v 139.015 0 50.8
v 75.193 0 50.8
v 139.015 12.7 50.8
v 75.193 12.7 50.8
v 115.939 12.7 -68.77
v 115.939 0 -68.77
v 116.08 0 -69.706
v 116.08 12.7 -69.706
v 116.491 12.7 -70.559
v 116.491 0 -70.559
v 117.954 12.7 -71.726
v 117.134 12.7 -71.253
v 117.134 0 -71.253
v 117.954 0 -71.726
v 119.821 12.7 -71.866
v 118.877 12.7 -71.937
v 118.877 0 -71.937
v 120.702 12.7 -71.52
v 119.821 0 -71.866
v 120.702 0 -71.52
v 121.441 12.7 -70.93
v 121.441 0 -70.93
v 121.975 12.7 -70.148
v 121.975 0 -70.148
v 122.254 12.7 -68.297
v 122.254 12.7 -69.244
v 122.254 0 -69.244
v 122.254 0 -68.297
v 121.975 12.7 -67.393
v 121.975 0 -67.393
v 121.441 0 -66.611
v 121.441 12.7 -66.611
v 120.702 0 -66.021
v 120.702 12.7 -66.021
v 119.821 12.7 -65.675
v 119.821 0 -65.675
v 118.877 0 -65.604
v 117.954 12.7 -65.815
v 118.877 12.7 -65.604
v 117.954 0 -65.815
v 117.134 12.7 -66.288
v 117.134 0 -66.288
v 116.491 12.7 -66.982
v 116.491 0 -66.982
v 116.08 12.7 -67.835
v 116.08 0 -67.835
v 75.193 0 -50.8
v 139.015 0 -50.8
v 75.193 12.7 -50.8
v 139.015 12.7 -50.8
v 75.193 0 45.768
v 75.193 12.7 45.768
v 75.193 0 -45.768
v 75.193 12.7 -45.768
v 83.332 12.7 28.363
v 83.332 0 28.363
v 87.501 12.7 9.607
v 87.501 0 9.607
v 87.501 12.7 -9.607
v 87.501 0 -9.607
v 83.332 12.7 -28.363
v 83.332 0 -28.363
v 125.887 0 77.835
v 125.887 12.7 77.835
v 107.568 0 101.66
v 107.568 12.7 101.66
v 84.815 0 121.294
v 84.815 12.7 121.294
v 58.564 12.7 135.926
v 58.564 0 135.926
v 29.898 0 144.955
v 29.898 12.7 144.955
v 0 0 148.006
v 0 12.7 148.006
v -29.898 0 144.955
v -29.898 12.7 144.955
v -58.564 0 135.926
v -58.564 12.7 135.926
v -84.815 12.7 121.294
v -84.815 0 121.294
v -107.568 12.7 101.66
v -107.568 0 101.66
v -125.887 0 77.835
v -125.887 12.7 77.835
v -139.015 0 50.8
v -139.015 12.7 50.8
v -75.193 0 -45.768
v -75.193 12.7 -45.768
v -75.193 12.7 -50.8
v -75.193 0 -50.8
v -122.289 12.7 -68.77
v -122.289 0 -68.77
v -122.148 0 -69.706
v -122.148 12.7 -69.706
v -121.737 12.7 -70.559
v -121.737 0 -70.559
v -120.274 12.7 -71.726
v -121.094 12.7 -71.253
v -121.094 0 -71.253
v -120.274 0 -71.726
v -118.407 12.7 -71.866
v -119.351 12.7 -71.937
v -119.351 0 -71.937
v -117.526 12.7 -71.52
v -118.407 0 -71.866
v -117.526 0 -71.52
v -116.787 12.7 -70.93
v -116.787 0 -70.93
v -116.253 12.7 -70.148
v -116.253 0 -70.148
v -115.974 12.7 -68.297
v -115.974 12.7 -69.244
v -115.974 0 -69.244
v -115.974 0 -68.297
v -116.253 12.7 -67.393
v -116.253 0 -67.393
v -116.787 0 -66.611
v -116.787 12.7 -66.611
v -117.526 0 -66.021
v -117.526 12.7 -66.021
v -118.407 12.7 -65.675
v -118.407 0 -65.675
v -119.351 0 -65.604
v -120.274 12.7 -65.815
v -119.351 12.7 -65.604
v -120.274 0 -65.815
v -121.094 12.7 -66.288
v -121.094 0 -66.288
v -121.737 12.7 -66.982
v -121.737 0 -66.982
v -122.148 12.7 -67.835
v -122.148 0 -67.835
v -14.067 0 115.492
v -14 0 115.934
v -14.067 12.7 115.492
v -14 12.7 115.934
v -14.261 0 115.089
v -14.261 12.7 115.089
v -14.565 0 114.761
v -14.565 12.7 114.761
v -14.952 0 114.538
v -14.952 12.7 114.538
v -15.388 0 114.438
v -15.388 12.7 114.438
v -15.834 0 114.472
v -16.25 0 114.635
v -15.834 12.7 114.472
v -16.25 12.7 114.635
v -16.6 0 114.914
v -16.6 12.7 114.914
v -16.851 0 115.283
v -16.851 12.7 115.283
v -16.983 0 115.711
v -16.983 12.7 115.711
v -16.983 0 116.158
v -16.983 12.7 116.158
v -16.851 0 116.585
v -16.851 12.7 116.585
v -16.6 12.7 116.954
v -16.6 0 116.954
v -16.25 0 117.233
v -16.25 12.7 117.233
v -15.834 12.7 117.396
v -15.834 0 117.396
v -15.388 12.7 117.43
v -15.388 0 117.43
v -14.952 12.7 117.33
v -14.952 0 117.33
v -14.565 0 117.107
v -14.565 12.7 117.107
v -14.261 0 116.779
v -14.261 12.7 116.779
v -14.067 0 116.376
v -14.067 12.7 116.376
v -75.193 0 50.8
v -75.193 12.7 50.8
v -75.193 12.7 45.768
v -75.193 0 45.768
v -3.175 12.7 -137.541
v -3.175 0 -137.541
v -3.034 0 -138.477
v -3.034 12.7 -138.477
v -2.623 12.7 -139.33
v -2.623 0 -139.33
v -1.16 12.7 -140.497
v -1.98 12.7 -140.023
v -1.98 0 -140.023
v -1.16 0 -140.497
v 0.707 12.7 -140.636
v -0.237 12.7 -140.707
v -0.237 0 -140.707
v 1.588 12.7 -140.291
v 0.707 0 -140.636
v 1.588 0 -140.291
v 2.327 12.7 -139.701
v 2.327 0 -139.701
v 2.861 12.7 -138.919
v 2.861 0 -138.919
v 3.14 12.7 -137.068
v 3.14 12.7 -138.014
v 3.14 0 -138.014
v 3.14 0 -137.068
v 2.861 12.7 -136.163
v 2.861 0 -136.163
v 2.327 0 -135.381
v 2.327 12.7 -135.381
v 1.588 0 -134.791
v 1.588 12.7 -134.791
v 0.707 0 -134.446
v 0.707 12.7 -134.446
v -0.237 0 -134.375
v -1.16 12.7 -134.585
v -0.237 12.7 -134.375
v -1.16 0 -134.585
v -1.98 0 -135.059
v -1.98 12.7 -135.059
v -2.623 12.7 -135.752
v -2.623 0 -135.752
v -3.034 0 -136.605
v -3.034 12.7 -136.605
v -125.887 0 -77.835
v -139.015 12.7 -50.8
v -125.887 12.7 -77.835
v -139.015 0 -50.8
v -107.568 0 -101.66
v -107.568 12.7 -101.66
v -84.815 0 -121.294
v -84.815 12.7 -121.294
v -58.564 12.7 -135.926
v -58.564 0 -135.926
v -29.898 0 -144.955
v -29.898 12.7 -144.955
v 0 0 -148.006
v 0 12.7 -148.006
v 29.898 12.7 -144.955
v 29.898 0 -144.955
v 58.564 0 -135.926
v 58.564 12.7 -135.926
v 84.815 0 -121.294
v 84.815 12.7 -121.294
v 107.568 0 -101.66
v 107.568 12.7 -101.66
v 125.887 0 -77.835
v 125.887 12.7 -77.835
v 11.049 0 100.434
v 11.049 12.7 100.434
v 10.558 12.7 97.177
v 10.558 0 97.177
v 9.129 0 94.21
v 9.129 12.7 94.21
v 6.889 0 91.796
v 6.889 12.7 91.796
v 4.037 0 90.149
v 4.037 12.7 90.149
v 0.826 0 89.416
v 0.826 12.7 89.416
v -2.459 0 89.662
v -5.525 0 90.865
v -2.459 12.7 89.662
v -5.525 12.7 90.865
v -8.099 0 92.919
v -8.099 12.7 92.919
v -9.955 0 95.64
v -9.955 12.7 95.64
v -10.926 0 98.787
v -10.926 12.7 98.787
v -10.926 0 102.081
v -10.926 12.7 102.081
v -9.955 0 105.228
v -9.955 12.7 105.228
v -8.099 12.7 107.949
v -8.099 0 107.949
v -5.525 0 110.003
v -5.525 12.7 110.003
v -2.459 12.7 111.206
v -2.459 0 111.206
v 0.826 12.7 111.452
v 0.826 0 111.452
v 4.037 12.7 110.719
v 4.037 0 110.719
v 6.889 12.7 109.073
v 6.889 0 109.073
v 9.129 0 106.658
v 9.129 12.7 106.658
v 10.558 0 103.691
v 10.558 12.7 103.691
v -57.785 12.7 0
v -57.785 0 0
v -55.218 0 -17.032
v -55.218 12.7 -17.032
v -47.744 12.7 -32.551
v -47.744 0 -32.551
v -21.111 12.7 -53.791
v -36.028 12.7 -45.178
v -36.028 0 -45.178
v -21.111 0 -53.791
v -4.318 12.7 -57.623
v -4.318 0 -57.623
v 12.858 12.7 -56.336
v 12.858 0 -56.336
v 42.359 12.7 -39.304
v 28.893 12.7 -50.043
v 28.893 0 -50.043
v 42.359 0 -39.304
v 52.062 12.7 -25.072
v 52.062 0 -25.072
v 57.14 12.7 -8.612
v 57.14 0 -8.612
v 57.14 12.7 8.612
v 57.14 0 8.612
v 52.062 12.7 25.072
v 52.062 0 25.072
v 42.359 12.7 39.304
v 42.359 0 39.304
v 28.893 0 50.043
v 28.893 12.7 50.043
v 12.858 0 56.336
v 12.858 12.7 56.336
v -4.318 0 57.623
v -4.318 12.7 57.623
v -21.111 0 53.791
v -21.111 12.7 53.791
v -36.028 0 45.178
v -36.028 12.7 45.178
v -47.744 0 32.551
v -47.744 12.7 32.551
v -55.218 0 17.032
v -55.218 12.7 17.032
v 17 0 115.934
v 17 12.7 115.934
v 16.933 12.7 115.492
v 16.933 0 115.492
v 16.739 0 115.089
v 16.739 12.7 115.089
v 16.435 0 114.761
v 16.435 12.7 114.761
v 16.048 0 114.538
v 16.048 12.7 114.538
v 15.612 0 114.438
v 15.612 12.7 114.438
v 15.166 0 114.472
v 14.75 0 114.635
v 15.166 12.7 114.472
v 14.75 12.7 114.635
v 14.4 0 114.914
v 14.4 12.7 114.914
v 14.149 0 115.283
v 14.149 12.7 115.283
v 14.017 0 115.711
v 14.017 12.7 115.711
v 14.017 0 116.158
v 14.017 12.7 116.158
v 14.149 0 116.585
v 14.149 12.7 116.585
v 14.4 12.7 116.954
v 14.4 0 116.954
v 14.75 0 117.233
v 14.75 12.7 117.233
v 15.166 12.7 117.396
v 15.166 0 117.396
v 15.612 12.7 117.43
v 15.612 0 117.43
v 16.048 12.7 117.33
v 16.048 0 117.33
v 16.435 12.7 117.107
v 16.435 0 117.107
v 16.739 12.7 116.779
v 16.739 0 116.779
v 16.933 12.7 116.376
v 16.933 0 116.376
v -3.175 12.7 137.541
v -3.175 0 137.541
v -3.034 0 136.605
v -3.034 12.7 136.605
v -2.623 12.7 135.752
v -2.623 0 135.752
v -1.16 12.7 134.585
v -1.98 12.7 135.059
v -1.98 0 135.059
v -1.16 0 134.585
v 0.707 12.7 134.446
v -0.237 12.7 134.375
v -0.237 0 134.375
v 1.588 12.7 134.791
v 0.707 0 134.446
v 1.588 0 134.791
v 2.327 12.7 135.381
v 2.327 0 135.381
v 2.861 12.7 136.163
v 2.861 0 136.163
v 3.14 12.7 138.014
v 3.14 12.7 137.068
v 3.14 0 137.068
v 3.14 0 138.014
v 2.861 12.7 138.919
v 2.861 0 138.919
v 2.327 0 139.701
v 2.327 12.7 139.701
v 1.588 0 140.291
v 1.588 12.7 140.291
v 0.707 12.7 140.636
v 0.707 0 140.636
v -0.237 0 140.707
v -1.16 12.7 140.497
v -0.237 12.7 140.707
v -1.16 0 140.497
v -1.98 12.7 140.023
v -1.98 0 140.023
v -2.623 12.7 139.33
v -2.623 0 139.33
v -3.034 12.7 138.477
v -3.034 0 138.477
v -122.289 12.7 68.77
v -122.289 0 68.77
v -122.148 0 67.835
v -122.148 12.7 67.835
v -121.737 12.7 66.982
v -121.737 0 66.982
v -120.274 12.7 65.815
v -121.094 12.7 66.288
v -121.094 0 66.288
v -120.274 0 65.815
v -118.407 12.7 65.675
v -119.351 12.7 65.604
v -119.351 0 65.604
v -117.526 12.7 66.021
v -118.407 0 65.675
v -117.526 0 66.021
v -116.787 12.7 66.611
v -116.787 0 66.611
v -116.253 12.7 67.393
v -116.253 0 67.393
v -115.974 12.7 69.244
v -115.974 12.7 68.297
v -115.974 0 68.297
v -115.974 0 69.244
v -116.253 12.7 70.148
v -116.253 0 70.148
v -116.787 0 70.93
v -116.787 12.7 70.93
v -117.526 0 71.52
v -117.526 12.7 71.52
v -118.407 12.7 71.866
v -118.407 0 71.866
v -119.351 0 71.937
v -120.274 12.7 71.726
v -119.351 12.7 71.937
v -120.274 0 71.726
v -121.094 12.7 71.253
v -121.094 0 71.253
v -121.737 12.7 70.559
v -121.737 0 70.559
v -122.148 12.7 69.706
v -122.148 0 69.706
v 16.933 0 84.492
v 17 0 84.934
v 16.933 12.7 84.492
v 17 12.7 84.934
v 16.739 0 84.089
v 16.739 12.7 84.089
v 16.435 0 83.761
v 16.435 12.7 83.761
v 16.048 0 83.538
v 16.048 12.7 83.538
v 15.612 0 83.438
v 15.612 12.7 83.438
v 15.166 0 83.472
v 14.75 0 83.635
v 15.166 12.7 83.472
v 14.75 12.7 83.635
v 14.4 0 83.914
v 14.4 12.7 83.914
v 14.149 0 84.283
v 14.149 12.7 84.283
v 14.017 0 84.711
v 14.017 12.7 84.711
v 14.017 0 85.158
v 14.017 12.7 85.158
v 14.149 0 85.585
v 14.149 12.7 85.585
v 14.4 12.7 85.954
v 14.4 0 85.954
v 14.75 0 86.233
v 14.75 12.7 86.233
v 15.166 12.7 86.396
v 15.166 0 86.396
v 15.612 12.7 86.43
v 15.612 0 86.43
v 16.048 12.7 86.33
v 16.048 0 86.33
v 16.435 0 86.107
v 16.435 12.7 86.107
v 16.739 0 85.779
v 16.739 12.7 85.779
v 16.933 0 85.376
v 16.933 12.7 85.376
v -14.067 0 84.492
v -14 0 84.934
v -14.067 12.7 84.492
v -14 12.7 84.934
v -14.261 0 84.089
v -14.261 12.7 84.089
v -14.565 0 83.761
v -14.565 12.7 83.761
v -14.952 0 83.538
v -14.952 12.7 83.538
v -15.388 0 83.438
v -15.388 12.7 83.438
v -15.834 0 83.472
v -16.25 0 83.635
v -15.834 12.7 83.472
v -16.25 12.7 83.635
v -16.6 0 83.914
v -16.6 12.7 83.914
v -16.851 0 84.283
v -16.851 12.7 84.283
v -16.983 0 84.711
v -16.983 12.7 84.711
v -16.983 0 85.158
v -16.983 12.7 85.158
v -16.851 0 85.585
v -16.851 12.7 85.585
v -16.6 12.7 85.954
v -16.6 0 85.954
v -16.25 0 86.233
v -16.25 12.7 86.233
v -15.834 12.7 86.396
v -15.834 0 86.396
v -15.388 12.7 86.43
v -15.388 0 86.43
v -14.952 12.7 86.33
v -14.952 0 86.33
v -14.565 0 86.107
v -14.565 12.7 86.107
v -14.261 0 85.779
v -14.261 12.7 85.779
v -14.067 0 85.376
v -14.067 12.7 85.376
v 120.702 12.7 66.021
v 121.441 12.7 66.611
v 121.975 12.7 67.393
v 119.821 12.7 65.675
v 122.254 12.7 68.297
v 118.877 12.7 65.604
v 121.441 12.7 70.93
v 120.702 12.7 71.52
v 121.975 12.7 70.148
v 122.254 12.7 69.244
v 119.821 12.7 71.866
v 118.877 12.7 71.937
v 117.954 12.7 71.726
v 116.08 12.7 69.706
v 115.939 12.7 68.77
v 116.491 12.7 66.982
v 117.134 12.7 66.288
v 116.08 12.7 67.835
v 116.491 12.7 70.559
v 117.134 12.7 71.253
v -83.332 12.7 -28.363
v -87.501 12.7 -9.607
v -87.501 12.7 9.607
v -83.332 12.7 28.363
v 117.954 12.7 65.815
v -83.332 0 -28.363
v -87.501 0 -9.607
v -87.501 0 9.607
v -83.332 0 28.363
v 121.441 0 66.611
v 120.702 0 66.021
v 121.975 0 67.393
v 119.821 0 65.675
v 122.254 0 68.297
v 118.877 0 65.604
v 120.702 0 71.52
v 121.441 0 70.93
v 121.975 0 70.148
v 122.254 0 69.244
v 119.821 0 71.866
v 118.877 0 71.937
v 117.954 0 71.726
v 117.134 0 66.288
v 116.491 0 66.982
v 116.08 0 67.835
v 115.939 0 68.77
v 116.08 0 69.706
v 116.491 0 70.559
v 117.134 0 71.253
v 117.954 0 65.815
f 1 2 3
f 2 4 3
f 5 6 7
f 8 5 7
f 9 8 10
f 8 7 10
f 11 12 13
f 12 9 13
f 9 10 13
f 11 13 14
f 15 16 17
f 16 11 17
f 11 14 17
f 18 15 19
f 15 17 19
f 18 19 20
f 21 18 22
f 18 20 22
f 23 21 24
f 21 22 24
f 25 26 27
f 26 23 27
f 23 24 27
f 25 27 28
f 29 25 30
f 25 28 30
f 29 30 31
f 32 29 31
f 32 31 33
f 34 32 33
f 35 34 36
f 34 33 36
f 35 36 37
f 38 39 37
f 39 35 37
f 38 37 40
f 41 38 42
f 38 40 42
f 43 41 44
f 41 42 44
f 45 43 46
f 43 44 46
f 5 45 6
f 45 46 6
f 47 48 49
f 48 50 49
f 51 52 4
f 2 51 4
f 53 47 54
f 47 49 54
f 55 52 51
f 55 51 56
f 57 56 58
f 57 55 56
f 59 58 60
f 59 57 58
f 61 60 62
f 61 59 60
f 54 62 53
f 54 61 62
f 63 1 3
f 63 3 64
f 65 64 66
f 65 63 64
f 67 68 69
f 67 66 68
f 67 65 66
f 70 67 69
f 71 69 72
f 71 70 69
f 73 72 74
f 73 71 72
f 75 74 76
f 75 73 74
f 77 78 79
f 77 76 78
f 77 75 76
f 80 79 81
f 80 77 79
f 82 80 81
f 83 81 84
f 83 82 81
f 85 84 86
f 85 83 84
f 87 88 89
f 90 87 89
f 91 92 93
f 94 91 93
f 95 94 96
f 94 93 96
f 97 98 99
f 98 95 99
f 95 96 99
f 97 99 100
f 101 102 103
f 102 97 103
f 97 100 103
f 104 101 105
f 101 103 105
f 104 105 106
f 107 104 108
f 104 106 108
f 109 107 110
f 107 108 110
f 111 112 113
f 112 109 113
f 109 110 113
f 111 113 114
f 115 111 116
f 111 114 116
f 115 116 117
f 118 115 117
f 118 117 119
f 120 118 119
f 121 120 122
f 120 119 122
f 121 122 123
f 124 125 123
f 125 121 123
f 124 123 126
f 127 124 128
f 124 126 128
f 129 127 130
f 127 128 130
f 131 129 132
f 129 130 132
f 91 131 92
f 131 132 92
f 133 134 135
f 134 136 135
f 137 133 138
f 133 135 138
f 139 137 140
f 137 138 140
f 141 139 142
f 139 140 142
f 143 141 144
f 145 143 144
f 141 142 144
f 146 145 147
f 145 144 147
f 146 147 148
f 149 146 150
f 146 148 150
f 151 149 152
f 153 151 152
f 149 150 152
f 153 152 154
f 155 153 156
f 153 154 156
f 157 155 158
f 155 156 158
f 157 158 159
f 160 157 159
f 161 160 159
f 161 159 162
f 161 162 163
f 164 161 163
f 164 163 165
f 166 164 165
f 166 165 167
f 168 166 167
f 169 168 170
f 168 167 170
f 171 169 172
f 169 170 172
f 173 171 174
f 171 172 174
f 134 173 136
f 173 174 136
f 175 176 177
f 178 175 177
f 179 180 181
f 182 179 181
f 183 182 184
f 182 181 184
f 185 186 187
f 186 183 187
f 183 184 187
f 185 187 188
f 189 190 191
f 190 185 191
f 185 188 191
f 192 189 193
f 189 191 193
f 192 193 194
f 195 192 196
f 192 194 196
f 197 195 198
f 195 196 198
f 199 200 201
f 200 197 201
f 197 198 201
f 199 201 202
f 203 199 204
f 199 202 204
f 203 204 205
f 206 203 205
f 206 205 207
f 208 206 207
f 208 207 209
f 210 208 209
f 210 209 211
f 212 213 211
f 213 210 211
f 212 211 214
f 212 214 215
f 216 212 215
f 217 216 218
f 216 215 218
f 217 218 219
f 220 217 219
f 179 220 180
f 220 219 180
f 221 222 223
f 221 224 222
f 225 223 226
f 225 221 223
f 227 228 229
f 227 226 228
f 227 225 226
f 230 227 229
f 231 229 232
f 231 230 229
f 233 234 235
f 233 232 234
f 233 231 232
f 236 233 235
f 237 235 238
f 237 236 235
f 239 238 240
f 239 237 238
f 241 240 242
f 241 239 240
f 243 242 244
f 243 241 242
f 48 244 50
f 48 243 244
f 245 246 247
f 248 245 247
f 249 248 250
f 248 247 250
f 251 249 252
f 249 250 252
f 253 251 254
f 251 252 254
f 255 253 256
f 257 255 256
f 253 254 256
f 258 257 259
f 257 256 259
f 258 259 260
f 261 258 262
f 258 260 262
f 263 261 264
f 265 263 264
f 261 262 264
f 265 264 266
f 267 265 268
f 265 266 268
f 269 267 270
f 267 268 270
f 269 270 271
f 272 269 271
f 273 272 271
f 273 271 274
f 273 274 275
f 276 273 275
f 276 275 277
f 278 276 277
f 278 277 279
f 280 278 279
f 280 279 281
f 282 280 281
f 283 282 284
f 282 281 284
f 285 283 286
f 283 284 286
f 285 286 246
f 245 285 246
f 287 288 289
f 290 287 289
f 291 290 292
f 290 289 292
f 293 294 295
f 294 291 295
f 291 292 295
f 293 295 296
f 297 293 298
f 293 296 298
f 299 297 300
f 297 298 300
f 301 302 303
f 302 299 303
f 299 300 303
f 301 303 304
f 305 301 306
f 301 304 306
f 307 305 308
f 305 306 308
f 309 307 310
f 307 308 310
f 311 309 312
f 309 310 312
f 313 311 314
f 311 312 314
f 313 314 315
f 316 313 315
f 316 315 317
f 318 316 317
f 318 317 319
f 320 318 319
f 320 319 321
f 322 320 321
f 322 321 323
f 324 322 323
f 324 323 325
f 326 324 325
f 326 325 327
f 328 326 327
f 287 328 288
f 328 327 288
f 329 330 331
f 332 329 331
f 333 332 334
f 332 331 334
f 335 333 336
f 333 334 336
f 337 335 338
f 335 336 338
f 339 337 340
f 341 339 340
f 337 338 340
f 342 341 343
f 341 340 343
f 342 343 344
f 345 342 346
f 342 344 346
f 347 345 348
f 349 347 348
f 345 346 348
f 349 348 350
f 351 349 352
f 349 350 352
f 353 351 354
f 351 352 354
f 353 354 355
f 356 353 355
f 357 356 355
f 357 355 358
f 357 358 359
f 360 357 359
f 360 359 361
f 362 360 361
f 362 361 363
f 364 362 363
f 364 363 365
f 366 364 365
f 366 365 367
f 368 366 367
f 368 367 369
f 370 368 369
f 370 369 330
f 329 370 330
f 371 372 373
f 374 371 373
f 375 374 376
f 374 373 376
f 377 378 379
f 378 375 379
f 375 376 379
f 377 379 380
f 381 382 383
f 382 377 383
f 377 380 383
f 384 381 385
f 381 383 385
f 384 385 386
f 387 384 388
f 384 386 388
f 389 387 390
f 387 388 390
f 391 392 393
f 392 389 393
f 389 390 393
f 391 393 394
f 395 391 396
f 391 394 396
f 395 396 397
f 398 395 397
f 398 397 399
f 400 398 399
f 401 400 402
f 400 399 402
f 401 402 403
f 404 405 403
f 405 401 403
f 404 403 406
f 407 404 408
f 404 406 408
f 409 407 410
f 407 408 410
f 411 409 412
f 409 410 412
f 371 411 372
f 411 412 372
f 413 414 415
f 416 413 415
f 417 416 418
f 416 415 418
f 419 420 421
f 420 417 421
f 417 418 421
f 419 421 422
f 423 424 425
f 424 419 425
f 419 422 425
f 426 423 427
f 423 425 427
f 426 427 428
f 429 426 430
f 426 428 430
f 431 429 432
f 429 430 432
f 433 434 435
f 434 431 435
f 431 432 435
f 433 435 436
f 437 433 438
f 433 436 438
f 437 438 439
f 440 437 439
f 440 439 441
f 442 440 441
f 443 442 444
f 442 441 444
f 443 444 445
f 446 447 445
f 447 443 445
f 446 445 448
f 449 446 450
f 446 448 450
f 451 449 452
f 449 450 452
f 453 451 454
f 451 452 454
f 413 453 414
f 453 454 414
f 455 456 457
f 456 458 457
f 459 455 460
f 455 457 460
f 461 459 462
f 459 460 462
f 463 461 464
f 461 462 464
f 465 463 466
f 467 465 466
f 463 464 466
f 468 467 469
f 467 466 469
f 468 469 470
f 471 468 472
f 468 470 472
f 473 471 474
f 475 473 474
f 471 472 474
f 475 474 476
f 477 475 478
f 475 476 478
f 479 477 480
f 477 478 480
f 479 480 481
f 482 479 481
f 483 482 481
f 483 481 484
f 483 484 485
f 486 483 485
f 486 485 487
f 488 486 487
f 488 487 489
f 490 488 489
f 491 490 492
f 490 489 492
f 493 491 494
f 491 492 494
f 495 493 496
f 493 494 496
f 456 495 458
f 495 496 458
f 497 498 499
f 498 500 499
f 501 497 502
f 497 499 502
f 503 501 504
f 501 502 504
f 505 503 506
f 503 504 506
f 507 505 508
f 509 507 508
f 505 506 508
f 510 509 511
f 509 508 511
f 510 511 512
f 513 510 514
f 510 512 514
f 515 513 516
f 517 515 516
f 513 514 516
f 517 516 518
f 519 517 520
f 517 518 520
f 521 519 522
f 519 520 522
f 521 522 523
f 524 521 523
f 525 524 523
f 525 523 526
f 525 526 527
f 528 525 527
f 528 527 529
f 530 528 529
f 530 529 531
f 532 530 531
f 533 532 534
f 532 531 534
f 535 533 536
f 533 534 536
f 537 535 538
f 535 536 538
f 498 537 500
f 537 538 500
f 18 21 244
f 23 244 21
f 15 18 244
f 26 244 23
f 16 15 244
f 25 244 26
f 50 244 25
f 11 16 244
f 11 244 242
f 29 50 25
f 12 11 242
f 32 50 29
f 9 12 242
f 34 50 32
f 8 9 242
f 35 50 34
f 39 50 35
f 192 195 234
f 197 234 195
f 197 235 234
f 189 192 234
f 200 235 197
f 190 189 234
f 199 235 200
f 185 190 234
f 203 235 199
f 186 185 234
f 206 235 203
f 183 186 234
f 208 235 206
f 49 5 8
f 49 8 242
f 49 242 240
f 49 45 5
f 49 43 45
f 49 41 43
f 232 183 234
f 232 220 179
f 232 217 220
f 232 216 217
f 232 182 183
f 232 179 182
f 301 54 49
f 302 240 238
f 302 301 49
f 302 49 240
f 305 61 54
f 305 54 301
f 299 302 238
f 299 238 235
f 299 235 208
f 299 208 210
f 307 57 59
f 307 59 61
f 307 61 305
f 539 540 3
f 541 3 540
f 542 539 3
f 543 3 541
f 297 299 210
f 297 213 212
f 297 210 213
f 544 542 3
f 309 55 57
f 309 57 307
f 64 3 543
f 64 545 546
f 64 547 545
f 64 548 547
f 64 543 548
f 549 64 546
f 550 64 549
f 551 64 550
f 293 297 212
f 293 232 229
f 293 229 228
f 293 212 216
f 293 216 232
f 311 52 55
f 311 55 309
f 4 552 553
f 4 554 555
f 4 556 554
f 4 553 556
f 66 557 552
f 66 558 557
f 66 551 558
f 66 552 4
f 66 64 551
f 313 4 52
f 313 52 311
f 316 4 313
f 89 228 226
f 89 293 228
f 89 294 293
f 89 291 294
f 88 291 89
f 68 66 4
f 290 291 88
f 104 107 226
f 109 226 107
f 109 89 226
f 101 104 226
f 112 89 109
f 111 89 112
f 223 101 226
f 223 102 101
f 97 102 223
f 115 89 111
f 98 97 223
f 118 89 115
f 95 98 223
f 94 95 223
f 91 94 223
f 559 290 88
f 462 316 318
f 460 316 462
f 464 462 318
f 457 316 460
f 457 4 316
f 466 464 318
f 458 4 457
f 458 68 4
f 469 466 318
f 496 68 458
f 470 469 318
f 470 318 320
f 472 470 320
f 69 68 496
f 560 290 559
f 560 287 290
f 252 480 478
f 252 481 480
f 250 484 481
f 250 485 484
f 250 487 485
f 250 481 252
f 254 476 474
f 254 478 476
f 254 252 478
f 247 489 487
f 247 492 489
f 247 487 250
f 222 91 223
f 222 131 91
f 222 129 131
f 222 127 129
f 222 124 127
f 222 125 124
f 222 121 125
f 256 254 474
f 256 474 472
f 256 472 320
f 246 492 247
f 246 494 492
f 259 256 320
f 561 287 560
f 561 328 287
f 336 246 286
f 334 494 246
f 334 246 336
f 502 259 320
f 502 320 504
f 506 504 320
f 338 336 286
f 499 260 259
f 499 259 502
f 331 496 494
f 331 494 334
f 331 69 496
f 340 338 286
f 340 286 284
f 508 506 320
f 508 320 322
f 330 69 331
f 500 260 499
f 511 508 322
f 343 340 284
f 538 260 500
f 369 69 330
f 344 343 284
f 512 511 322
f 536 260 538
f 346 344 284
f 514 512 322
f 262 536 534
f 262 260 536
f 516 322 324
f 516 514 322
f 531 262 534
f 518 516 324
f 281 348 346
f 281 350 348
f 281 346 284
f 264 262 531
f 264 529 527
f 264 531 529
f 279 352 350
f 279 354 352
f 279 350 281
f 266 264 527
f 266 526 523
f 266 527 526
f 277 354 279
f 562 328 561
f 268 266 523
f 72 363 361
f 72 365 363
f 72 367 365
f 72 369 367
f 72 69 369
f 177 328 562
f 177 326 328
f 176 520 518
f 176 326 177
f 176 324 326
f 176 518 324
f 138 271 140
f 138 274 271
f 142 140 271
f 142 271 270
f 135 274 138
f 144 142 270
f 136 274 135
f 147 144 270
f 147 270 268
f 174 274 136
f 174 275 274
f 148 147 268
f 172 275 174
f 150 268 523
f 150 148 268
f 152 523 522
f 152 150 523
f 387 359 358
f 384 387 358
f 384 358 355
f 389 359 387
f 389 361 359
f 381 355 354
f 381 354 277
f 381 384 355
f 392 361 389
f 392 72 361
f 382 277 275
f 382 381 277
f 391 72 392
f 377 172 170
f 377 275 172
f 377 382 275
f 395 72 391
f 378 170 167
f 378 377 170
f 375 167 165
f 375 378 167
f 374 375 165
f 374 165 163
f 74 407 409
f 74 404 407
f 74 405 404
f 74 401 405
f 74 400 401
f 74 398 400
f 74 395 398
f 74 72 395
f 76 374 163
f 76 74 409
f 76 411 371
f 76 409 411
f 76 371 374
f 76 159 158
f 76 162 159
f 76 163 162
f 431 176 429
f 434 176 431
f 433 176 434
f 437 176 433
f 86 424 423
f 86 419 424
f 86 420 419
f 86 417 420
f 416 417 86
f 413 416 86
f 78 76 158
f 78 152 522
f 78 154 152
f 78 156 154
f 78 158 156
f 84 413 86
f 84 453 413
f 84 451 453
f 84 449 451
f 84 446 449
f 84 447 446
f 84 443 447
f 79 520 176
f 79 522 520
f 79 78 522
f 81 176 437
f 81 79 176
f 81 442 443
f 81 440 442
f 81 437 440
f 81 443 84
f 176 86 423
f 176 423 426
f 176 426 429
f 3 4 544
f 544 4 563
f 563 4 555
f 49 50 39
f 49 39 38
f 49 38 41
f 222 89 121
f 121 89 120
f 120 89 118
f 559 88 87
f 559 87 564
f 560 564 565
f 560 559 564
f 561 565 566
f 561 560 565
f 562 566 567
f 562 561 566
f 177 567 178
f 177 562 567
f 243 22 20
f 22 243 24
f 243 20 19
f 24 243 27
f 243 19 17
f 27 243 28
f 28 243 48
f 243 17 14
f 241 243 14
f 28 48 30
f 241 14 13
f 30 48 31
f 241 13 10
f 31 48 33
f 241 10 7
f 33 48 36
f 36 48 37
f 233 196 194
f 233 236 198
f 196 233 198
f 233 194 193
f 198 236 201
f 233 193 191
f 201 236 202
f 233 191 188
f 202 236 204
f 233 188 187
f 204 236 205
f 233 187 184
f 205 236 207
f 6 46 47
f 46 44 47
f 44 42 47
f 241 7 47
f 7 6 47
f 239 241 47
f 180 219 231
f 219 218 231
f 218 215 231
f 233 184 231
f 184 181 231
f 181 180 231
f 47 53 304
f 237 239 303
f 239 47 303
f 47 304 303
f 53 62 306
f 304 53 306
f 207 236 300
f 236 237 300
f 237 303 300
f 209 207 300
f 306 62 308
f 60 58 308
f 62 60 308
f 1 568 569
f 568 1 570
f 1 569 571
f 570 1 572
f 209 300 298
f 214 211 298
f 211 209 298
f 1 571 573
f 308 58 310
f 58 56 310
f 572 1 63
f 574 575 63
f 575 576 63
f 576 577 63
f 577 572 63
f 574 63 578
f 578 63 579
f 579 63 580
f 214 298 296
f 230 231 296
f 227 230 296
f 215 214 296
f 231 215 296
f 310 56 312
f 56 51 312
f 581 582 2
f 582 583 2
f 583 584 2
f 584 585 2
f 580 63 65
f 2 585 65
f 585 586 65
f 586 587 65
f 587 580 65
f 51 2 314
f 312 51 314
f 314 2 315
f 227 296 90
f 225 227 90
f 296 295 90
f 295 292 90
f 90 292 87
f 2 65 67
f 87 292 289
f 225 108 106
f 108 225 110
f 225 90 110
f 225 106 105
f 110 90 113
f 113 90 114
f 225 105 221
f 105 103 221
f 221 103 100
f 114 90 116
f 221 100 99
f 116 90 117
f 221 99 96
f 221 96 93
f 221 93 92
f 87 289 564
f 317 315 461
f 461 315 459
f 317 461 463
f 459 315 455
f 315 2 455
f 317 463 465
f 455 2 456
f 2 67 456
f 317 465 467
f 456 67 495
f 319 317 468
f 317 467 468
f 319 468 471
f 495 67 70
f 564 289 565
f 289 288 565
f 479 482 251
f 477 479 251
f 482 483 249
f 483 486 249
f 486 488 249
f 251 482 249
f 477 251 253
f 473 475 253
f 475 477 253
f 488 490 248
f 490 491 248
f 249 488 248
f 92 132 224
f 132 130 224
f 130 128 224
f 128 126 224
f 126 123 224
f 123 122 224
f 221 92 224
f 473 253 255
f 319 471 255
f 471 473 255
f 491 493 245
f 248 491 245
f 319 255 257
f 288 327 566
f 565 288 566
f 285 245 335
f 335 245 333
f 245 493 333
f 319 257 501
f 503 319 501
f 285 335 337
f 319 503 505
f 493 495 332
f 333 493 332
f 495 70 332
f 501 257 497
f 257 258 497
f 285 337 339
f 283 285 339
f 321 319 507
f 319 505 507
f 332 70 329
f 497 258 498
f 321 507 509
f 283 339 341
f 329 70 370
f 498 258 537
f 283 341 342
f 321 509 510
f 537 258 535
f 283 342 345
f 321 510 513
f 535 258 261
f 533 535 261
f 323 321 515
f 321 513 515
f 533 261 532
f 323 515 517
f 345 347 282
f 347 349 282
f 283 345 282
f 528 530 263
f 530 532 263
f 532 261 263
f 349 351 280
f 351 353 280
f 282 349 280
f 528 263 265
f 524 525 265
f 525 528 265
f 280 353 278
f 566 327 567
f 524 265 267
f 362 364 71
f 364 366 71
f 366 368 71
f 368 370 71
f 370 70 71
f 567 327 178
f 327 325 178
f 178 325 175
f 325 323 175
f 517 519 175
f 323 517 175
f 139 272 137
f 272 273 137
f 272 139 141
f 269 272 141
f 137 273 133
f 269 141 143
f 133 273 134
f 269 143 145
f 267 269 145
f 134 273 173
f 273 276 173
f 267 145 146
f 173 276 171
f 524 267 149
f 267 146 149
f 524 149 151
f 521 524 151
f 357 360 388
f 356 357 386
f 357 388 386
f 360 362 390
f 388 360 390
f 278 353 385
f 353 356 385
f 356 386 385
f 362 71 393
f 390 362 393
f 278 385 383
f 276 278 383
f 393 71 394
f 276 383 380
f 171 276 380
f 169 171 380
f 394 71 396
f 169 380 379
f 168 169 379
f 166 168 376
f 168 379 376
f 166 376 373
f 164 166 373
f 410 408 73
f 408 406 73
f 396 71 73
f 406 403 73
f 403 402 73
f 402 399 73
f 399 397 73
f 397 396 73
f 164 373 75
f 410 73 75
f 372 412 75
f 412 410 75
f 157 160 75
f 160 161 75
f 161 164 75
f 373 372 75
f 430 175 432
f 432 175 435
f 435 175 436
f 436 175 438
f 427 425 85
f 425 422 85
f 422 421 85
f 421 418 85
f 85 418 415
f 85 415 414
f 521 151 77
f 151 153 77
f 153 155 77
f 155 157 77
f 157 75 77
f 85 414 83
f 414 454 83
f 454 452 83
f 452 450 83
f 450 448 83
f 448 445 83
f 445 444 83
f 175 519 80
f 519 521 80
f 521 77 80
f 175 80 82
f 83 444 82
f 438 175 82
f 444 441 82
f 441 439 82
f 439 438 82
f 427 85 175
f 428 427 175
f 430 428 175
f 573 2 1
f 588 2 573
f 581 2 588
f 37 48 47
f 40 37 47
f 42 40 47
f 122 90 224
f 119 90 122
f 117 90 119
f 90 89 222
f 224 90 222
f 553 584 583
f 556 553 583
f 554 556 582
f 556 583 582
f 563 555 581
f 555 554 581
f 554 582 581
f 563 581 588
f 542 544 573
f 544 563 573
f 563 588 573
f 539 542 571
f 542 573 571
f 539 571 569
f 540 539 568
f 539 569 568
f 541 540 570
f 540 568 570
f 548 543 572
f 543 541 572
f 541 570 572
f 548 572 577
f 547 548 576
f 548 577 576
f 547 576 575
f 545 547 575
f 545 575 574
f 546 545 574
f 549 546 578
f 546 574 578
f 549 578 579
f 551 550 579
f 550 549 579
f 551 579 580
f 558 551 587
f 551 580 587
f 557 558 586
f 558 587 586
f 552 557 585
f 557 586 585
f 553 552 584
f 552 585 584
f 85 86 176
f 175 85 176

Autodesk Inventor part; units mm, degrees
ref_plane "YZ Plane" through (0, 0, 0) normal (1, 0, 0) x (0, 1, 0)
ref_plane "XZ Plane" through (0, 0, 0) normal (0, 1, 0) x (-1, 0, 0)
ref_plane "XY Plane" through (0, 0, 0) normal (0, 0, 1) x (1, 0, 0)
sketch "Sketch1" plane through (0, 0, 0) normal (0, 1, 0) x (-1, 0, 0)
  circle A0 centre (0, 0) radius 57.785
  circle A1 centre (0, 0) radius 148.0058
  line L0 (0, 0) -> (-122.3635, 70.6466) construction
  line L1 (0, 0) -> (141.2932, 0) construction
  line L2 (-122.3635, 70.6466) -> (0, 0) construction
  line L3 (0, 0) -> (-128.1768, -74.0029) construction
  circle A2 centre (0, 0) radius 148.0058 construction
  line L4 (0, 0) -> (148.0058, 0) construction
  circle A3 centre (0, 0) radius 137.541 construction
  circle A4 centre (-119.114, -68.7705) radius 3.175
  circle A5 centre (0, -137.541) radius 3.175
  circle A6 centre (119.114, -68.7705) radius 3.175
  circle A7 centre (119.114, 68.7705) radius 3.175
  circle A8 centre (0, 137.541) radius 3.175
  circle A9 centre (-119.114, 68.7705) radius 3.175
  dimension "d22" = 275.082
  dimension "d16" = 115.57
  dimension "d17" = 296.0116
  dimension "d20" = 150
  dimension "d21" = 150
  dimension "d23" = 6.35
  dimension "d24" = 360
extrude "Extrusion1" add sketch "Sketch1" along normal blind 12.7
sketch "Sketch2" plane through (0, 12.7, 0) normal (0, 1, 0) x (1, 0, 0)
  circle A0 centre (0, 0) radius 123.4694 construction
  line L0 (-21.15, -84.9341) -> (-21.15, -115.9341) construction
  line L1 (15.5, -121.5841) -> (-15.5, -121.5841) construction
  line L2 (21.15, -115.9341) -> (21.15, -84.9341) construction
  line L3 (-15.5, -79.2841) -> (15.5, -79.2841) construction
  line L4 (15.5, -79.2841) -> (21.15, -84.9341) construction
  line L5 (21.15, -115.9341) -> (15.5, -121.5841) construction
  line L6 (-15.5, -121.5841) -> (-21.15, -115.9341) construction
  line L7 (-21.15, -84.9341) -> (-15.5, -79.2841) construction
  line L8 (-15.5, -115.9341) -> (15.5, -115.9341) construction
  line L9 (15.5, -115.9341) -> (15.5, -84.9341) construction
  line L10 (15.5, -84.9341) -> (-15.5, -84.9341) construction
  line L11 (-15.5, -84.9341) -> (-15.5, -115.9341) construction
  line L12 (-15.5, -115.9341) -> (15.5, -84.9341) construction
  line L13 (15.5, -115.9341) -> (-15.5, -84.9341) construction
  circle A1 centre (15.5, -84.9341) radius 1.5
  circle A2 centre (15.5, -115.9341) radius 1.5
  circle A3 centre (-15.5, -115.9341) radius 1.5
  circle A4 centre (-15.5, -84.9341) radius 1.5
  circle A5 centre (0, -100.4341) radius 11.049
  circle A6 centre (0, -100.4341) radius 22.9616 construction
  dimension "d27" = 246.9388
  dimension "d32" = 3
  dimension "d33" = 3
  dimension "d34" = 3
  dimension "d35" = 22.098
  dimension "d44" = 45.9232
extrude "Extrusion2" cut sketch "Sketch2" against normal through all
sketch "Sketch3" plane through (0, 12.7, 0) normal (0, 1, 0) x (1, 0, 0)
  line L0 (-148.0058, 50.8) -> (-148.0058, -50.8)
  line L1 (148.0058, -50.8) -> (148.0058, 50.8)
  line L2 (148.0058, 50.8) -> (-148.0058, -50.8) construction
  line L3 (-148.0058, 50.8) -> (148.0058, -50.8) construction
  line L4 (75.193, -50.8) -> (-75.193, 50.8) construction
  line L5 (-75.193, -50.8) -> (75.193, 50.8) construction
  line L6 (-148.0058, -50.8) -> (-75.193, -50.8)
  line L7 (75.193, -50.8) -> (148.0058, -50.8)
  line L8 (148.0058, 50.8) -> (75.193, 50.8)
  line L9 (-75.193, 50.8) -> (-148.0058, 50.8)
  line L10 (-75.193, -50.8) -> (-75.193, -45.7676)
  line L11 (-75.193, 45.7676) -> (-75.193, 50.8)
  line L12 (75.193, 50.8) -> (75.193, 45.7676)
  line L13 (75.193, -45.7676) -> (75.193, -50.8)
  arc A0 (75.193, -45.7676) -> (75.193, 45.7676) centre (0, 0) ccw
  arc A1 (-75.193, 45.7676) -> (-75.193, -45.7676) centre (0, 0) ccw
  dimension "d38" = 296.0116
  dimension "d39" = 101.6
extrude "Extrusion4" cut sketch "Sketch3" against normal through all
properties part number "Turntable Mount" material "PVC-Piping"
